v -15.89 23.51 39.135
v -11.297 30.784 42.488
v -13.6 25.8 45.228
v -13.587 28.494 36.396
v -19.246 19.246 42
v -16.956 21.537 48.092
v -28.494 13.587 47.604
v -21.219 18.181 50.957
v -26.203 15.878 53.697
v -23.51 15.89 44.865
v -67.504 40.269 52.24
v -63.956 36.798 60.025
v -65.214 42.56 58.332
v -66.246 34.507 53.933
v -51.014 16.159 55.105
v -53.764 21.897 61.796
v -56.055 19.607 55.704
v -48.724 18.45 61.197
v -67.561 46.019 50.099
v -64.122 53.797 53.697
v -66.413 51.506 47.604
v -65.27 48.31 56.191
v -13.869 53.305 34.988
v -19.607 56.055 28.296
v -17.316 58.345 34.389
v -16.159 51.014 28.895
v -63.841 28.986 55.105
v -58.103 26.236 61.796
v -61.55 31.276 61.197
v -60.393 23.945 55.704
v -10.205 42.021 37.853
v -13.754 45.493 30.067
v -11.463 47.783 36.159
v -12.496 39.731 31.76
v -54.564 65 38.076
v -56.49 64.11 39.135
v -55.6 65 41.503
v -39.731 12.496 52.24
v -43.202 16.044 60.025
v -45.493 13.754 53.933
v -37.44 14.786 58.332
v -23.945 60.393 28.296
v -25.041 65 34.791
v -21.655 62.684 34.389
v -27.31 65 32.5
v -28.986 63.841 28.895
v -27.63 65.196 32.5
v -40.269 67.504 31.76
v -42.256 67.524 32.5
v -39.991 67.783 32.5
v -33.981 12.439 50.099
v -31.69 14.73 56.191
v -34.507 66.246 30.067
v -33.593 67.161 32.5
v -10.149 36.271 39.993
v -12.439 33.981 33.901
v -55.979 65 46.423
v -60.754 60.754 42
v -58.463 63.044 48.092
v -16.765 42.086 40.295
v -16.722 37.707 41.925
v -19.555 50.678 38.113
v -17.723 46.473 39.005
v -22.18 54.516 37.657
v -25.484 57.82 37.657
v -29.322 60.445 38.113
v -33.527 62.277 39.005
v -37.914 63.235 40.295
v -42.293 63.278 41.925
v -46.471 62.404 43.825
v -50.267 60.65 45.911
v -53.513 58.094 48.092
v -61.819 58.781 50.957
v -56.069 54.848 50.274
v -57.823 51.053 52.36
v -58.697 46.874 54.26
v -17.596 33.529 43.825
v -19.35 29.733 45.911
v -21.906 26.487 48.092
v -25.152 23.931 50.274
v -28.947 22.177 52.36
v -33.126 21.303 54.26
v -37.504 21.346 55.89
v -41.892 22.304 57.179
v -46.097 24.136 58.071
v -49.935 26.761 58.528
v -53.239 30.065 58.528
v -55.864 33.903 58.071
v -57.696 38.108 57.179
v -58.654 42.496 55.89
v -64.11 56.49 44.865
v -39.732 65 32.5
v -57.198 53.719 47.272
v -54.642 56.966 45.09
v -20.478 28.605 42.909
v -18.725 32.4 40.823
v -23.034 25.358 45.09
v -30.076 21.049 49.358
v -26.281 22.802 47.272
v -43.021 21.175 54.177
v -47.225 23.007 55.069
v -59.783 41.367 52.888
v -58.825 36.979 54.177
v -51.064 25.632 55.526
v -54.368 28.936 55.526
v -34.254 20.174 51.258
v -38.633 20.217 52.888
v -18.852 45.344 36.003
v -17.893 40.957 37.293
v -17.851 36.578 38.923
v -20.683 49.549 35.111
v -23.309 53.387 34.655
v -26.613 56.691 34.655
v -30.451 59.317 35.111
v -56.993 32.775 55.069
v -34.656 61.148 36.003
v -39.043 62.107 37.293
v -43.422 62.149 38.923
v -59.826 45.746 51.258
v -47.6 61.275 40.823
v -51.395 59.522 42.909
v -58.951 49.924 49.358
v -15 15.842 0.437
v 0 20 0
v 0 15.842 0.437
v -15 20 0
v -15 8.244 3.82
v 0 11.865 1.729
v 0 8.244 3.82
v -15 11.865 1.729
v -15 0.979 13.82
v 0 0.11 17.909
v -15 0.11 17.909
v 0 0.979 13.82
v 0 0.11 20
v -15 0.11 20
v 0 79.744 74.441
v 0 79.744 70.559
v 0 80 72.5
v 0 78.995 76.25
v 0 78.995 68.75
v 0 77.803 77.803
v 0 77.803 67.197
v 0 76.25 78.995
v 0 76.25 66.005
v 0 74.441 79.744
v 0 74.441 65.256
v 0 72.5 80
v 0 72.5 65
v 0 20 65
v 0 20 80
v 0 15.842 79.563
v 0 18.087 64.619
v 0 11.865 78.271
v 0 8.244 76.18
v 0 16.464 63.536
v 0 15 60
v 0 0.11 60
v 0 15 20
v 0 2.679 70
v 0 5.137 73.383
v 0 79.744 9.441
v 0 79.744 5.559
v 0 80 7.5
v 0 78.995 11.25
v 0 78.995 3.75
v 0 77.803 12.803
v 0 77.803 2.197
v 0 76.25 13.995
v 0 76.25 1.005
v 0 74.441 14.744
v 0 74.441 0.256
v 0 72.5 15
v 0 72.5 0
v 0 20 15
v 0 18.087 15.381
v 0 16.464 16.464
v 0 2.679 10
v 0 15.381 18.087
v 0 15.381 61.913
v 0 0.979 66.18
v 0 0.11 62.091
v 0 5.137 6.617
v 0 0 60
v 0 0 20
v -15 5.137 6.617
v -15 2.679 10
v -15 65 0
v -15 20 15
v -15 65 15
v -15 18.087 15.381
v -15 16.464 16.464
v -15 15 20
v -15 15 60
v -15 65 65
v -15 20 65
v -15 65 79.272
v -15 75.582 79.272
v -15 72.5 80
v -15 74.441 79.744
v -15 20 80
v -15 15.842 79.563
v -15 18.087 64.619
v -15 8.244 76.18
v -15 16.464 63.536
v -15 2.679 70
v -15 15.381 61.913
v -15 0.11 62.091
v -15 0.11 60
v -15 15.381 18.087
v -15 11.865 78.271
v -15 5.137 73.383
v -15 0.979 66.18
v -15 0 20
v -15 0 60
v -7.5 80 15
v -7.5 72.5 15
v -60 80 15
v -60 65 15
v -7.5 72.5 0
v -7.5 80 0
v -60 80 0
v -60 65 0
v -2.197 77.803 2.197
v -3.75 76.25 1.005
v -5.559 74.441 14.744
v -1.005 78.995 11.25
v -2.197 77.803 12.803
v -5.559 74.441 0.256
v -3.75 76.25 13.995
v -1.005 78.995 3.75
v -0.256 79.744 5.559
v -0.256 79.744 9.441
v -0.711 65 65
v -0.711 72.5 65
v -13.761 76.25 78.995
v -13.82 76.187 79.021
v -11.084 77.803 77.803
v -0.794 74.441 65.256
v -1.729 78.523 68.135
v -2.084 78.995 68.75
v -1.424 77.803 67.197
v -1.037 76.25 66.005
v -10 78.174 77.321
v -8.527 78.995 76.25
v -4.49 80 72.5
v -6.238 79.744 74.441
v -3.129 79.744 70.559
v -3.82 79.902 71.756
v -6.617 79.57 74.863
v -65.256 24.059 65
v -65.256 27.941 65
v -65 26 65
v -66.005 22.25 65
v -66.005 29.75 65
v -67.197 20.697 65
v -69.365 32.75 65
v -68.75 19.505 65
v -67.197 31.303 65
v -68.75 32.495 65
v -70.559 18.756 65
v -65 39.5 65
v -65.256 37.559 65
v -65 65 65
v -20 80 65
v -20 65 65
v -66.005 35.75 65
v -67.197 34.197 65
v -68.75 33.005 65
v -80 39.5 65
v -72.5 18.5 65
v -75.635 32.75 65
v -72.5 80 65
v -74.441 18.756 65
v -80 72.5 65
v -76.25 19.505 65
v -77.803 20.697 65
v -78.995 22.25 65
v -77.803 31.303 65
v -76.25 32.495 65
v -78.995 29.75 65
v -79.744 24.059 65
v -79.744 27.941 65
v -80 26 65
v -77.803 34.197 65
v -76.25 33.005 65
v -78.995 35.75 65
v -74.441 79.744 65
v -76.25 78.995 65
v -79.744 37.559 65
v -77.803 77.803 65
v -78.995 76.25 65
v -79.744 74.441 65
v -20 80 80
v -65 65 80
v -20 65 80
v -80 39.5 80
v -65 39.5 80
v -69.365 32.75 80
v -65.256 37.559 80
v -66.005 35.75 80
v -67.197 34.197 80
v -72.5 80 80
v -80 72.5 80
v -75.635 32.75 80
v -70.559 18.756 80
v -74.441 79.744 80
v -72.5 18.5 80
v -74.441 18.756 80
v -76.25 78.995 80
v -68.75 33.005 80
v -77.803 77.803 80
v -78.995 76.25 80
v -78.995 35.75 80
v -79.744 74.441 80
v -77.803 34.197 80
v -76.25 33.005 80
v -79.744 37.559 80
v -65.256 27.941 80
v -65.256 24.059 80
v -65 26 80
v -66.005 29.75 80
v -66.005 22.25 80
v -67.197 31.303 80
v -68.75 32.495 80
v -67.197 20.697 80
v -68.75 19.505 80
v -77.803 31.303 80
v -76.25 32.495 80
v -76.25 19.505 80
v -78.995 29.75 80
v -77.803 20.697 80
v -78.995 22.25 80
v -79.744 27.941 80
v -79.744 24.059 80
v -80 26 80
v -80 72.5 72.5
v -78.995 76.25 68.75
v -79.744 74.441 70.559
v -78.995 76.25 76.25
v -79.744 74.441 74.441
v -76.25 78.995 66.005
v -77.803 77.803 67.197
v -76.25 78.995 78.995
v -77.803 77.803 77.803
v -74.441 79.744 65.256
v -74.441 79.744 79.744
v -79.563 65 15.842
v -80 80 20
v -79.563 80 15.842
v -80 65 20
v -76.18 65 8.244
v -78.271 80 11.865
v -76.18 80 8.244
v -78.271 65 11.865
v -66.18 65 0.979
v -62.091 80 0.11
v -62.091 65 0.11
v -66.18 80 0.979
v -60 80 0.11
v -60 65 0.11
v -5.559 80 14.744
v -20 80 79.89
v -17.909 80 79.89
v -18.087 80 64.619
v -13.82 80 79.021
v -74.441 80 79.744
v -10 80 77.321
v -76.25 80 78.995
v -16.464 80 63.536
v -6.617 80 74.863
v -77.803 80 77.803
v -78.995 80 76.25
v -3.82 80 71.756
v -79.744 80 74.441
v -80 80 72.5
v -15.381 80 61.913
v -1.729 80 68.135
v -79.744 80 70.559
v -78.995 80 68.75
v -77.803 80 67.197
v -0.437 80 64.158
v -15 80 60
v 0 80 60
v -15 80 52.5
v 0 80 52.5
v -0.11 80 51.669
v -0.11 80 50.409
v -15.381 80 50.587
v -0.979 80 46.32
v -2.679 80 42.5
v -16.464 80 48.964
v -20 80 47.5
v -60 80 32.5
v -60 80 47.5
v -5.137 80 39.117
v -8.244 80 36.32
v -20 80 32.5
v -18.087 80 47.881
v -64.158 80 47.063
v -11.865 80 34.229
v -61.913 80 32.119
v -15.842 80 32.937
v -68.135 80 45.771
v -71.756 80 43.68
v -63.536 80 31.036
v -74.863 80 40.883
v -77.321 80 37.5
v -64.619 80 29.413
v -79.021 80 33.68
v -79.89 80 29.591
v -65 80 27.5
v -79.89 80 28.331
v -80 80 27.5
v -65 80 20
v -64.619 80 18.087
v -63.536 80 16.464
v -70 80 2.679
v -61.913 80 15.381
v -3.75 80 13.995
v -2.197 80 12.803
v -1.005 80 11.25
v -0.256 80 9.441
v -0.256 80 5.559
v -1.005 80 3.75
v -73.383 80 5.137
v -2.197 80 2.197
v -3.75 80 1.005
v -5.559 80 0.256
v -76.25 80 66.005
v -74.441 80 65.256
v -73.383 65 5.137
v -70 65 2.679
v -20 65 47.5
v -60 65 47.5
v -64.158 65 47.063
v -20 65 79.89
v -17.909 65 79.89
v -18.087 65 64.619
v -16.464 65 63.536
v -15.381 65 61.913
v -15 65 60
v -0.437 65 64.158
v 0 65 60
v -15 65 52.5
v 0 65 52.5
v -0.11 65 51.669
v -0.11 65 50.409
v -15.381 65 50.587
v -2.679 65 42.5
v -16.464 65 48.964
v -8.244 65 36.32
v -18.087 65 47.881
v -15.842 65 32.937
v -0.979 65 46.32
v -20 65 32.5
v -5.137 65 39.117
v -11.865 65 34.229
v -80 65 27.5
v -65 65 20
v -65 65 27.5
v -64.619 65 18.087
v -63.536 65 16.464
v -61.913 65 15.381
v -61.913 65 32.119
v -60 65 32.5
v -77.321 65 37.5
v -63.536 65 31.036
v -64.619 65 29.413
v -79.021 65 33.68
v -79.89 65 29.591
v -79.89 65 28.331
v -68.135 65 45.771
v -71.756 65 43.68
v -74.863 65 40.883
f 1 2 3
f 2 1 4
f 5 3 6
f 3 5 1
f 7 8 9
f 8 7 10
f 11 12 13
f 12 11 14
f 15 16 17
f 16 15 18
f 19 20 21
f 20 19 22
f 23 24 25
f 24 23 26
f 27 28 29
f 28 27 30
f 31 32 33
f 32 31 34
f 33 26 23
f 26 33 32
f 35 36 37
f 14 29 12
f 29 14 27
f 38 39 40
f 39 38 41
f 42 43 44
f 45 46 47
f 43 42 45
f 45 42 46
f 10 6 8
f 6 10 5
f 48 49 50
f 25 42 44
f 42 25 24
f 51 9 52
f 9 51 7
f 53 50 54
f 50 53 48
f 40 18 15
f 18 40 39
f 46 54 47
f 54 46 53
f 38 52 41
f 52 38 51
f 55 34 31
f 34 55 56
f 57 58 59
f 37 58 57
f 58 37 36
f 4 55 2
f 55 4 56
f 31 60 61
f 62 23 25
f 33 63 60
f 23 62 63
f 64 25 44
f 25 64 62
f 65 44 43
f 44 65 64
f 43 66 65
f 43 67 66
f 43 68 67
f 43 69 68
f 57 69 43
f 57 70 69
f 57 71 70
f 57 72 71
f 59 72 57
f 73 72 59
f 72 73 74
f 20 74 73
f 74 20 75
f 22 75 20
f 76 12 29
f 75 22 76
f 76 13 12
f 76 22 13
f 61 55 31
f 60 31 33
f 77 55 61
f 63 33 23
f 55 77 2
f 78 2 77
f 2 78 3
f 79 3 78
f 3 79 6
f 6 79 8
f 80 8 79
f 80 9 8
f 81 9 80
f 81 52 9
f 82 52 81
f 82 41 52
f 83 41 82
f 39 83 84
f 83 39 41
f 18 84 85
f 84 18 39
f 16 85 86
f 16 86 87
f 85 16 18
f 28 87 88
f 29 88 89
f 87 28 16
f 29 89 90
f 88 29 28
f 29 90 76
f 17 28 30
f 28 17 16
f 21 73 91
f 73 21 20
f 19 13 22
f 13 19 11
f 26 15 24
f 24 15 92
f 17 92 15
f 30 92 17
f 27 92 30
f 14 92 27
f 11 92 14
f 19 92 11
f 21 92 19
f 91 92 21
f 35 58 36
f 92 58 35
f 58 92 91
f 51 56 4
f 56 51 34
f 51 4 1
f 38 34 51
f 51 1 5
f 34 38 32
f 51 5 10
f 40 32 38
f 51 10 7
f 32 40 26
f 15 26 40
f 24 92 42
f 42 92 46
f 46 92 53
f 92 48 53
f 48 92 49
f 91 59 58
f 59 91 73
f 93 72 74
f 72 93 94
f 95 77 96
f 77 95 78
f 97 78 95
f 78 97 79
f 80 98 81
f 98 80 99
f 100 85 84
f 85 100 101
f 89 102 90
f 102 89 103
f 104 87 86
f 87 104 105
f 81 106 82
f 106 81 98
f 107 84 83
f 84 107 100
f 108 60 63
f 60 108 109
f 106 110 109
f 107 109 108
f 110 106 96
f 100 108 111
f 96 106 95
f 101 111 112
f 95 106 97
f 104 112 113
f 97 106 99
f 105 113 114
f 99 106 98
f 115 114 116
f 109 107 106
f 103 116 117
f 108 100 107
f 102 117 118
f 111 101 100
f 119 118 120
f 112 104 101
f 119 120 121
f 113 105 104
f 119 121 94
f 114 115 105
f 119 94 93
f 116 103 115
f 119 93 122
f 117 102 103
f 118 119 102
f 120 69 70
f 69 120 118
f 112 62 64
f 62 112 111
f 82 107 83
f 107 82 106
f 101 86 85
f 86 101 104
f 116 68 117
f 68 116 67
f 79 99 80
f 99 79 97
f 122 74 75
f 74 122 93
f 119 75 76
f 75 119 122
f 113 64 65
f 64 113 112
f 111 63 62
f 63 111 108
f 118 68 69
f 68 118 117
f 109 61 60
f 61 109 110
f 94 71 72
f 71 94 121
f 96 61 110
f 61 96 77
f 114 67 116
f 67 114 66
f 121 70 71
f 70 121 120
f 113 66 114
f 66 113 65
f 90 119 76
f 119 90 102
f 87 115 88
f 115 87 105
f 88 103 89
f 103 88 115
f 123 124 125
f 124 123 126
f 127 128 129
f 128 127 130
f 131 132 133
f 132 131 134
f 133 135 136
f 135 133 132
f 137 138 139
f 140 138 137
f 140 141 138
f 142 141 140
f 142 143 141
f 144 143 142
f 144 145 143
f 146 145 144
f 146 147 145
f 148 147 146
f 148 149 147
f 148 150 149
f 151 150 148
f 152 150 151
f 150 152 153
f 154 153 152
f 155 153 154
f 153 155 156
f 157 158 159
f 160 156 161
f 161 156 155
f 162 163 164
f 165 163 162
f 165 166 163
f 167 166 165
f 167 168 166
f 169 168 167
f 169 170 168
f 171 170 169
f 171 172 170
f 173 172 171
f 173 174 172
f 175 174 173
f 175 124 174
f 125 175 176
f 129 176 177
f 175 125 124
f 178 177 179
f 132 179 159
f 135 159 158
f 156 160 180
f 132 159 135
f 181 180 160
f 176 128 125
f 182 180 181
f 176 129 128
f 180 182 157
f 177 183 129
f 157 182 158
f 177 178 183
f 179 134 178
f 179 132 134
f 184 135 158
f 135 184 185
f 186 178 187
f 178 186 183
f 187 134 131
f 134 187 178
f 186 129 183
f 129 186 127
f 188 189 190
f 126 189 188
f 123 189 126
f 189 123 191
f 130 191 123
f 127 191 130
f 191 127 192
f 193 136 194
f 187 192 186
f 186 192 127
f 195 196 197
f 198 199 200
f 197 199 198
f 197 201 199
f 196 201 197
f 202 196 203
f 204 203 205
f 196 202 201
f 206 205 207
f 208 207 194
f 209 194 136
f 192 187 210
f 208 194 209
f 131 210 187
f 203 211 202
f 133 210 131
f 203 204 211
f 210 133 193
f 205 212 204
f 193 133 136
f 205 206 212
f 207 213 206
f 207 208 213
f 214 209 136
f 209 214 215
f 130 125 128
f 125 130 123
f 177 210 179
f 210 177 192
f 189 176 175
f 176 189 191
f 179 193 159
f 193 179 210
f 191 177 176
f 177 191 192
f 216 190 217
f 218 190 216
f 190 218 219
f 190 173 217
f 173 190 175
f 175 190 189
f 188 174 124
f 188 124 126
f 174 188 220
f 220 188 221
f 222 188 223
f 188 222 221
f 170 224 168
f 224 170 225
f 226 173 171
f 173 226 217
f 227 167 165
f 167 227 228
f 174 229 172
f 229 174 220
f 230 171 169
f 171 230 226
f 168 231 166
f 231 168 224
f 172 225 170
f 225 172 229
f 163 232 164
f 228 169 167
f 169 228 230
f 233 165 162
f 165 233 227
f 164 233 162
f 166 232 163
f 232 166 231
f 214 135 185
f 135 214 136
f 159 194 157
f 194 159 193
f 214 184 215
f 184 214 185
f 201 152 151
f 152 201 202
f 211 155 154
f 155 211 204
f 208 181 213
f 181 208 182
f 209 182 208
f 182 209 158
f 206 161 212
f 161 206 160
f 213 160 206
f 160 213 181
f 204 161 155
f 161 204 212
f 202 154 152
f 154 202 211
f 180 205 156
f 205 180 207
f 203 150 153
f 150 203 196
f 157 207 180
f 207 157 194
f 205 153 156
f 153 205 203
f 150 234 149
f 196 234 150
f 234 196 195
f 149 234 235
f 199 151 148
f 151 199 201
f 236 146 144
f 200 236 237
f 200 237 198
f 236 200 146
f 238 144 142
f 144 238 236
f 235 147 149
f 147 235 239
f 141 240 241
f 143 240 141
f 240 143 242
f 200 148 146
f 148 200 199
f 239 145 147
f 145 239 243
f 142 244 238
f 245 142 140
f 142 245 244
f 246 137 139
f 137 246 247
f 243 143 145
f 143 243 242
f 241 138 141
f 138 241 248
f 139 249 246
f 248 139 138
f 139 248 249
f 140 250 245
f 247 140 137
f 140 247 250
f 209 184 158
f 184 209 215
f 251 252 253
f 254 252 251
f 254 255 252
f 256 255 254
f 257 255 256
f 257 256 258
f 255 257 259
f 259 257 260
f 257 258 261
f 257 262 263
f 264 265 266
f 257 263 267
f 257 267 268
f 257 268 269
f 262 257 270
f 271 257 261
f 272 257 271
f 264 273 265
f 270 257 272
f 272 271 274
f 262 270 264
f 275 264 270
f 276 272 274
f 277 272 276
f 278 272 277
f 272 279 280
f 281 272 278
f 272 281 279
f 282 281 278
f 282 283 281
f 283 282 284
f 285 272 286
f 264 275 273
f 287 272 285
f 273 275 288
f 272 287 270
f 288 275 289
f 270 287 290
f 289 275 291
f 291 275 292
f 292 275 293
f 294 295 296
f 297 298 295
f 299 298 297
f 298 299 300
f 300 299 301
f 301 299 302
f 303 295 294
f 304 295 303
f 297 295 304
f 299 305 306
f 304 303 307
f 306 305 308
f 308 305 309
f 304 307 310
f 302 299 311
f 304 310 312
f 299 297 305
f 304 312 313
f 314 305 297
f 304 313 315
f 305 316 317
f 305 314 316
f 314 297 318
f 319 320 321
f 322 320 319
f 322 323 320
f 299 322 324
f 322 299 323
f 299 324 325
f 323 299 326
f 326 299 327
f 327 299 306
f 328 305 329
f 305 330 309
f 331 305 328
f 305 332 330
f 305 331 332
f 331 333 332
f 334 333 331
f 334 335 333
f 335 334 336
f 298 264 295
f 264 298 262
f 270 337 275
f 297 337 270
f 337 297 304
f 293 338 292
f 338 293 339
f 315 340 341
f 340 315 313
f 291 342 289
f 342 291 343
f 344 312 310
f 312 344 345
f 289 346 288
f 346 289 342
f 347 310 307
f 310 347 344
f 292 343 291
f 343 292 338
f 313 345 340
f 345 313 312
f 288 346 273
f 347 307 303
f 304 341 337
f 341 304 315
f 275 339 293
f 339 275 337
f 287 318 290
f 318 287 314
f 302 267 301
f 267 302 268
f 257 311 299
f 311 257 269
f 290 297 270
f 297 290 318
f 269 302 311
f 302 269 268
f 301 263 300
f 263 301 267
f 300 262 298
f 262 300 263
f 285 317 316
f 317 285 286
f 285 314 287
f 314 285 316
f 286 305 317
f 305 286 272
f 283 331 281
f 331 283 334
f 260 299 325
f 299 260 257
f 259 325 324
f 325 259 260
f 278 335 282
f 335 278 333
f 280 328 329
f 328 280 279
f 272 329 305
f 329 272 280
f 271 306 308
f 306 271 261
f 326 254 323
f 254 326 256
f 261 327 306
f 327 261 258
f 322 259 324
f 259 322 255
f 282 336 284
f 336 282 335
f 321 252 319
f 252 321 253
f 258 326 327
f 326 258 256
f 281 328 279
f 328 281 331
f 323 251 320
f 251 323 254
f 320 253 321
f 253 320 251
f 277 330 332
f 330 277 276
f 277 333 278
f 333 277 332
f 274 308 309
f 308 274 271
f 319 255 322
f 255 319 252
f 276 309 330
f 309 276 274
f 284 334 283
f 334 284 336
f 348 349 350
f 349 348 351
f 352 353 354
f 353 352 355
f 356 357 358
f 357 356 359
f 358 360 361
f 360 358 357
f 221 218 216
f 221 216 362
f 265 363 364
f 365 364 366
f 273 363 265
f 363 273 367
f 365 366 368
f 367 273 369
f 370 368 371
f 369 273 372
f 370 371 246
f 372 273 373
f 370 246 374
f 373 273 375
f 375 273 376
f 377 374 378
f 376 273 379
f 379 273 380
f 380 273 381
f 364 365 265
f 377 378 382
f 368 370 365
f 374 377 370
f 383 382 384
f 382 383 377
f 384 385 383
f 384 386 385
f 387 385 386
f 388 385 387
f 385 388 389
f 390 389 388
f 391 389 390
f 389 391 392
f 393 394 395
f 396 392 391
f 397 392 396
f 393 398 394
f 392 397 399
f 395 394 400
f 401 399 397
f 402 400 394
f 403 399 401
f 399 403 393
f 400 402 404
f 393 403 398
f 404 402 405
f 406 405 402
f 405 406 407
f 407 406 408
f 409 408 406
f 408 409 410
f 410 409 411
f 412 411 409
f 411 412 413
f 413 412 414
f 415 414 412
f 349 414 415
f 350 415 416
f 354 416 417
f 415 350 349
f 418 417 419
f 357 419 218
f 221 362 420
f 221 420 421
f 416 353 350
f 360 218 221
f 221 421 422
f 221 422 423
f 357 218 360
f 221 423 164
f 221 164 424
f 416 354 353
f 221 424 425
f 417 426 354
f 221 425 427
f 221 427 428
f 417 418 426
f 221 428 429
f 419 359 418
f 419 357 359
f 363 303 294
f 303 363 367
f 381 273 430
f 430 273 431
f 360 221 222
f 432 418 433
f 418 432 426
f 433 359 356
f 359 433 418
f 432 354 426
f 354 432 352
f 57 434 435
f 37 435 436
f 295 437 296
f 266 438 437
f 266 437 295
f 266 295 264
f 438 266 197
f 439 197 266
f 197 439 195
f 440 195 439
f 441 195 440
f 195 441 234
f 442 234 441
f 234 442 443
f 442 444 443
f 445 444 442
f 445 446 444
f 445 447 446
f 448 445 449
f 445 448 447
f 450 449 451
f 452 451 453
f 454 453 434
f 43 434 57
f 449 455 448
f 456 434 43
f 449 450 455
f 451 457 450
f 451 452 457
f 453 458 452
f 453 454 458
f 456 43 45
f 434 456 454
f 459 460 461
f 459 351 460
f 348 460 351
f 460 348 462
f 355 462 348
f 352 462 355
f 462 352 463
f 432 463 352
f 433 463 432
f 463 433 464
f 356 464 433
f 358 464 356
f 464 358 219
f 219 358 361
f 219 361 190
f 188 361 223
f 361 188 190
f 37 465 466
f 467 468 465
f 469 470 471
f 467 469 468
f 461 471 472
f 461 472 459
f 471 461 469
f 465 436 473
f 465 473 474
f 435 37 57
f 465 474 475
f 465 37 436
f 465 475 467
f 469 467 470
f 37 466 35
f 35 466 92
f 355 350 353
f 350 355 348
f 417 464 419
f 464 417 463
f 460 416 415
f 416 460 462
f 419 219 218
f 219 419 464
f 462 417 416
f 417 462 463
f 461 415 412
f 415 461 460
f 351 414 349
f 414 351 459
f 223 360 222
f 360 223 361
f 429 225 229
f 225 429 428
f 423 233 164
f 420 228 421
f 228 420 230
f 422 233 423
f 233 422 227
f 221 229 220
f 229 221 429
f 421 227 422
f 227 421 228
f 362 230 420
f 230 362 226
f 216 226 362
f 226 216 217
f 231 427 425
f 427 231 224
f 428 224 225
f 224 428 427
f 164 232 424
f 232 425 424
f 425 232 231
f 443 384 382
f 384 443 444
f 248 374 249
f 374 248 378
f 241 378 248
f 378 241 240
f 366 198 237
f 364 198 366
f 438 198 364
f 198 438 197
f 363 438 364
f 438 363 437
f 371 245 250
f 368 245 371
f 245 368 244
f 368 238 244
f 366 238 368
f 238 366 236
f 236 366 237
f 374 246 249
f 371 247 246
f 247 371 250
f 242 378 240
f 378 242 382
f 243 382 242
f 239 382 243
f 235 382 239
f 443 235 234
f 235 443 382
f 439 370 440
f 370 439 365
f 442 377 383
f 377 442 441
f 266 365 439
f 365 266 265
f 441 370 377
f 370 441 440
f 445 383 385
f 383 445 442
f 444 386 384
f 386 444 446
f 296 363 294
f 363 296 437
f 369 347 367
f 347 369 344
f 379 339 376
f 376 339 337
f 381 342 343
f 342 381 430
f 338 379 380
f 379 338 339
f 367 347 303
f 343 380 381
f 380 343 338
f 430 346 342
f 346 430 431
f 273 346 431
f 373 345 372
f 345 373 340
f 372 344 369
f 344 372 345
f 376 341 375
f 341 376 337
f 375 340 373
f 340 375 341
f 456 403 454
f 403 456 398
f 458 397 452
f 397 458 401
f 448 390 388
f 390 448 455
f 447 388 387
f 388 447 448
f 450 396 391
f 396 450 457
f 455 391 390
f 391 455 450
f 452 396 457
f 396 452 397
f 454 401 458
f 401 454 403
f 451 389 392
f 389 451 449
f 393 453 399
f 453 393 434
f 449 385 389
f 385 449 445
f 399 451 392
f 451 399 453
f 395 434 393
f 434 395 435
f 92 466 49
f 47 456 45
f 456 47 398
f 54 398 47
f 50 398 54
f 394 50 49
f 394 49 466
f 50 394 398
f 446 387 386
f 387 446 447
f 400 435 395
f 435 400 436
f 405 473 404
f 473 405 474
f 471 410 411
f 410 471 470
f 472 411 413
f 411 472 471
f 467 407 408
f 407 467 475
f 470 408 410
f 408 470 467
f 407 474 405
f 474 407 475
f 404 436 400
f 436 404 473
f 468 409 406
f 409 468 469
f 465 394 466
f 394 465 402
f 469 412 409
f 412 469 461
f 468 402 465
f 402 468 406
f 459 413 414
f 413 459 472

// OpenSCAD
CUBE_SIZE=80;
LETTER_THICK=15;

ANNIVERSARY_COIN_DIAMETER= 44.7;
ANNIVERSARY_COIN_THICK = 3.4;


// Letter will go up in +Z, out in +Y, thick in -X
module LetterL(letterHeight, letterWidth, letterThick, curveRadius)
{
  // Straight length parts (not the curve, not the rounded end)
  straightLengthBottom = letterWidth - curveRadius - letterThick / 2;
  straightLengthTop    = letterHeight - curveRadius - letterThick / 2;
  
  // Bottom part
  translate([-letterThick, curveRadius, 0])
    cube([letterThick, straightLengthBottom, letterThick]);
  
  translate([-letterThick, curveRadius + straightLengthBottom, letterThick / 2])
    rotate(a=90, v=[0,1,0])
      cylinder(h=letterThick, r=(letterThick / 2)); 
  
  // Top part
  translate([-letterThick, 0, curveRadius])
    cube([letterThick, letterThick, straightLengthTop]);
  
  translate([-letterThick, letterThick / 2, curveRadius + straightLengthTop])
    rotate(a=90, v=[0,1,0])
      cylinder(h=letterThick, r=(letterThick / 2));
  
  // Big radius
  intersection()
  {
    translate([-letterThick, 0, 0])
      cube([letterThick, curveRadius + .0001, curveRadius + .0001]);
    
    difference()
    {
    translate([-letterThick, curveRadius, curveRadius])
      rotate(a=90, v=[0,1,0])
        cylinder(h=letterThick, r=curveRadius);
      
    translate([-letterThick-.5, curveRadius, curveRadius])
      rotate(a=90, v=[0,1,0])
        cylinder(h=letterThick+1, r=curveRadius - letterThick);
      
    }    
  }
}


module LetterC(letterSize, letterThick, curveRadius) 
{
  // Letter will be in Y and Z planes.  Thickness from X=0 towards negative X.
  bottomHeight = letterSize / 2 + letterThick;
  LetterL(bottomHeight, letterSize, letterThick, curveRadius);
  
  translate([-letterThick, 0, letterSize])
    rotate(a=180, v=[0,1,0])
      LetterL(bottomHeight, letterSize, letterThick, curveRadius);
  
}

module LetterS(letterSize, letterThick, curveRadius) 
{
  // There are 4 L's in an S (top, left, right, bottom)
  // top and bottom are the same size
  // left and right are the same size
  
  TB_width = curveRadius + letterThick / 2 + .1;
  TB_height = letterSize;
  
  translate([0, letterSize, 0])
    rotate(a=90, v=[1,0,0])
      LetterL(TB_height, TB_width, letterThick, curveRadius);
  
  translate([0, 0, letterSize])
    rotate(a=90, v=[-1,0,0])
      LetterL(TB_height, TB_width, letterThick, curveRadius);
  
  LR_width = letterSize / 2 + letterThick / 2 + .001;
  LR_height = curveRadius + letterThick / 2 + .001;
  
  translate([0,0,letterSize/2 - letterThick / 2])
  LetterL(LR_height, LR_width, letterThick, curveRadius);
  
  translate([0, letterSize, letterSize / 2 + letterThick / 2])
  rotate(a=180, v=[1,0,0])
  LetterL(LR_height, LR_width, letterThick, curveRadius);
  
  // There are also little sections that join bottom to the LR, and top to the LR
  littleSectsHeight = (letterSize - ( curveRadius * 4 - letterThick) ) / 2;
  echo("Little Sects Height = ", littleSectsHeight);
  
  translate([-letterThick, letterSize - letterThick, curveRadius])
    cube([letterThick, letterThick, littleSectsHeight]);
    
  translate([-letterThick, 0, letterSize / 2 - letterThick / 2 + curveRadius])
    cube([letterThick, letterThick, littleSectsHeight]);
  
}

// Just goes up +z
module LetterLittleI(letterSize, letterThick)
{
  // Going to have 3/5 of letter be stick part of i
  // Then on top of that a ball
  
  stickLen = letterSize / 5 * 3;
  stickCubeLen = stickLen - letterThick;
  
  // cube part of stick
  translate([-letterThick, 0, letterThick / 2])
    cube([letterThick, letterThick, stickCubeLen]);
  
  // bottom rounded part of stick
  translate([-letterThick, letterThick / 2, letterThick / 2])
    rotate(a=90, v=[0,1,0])
      cylinder(h=letterThick, r=letterThick / 2);
  
  translate([-letterThick, letterThick / 2,  + stickCubeLen + letterThick / 2])
    rotate(a=90, v=[0,1,0])
      cylinder(h=letterThick, r=letterThick / 2);

  translate([-letterThick, letterThick / 2, stickLen + letterThick * 2 / 5])
  rotate(a=90, v=[0,1,0])
    cylinder(h=letterThick, r=letterThick / 2);

}

module CoinHolder(coinDiameter, coinThick)
{
  COIN_WALL_THICK=3.5;
  
  
  
  difference()
  {
    cylinder(h=coinThick + COIN_WALL_THICK, r=coinDiameter / 2 + 2 * COIN_WALL_THICK);
    
    translate([0,0,COIN_WALL_THICK])
    cylinder(h=coinThick + 1, r=coinDiameter / 2);
  }
}

module graphicLogo(xSize, ySize, zSize)
{
  resize([xSize,ySize,zSize])
  intersection()
  {
    translate([0,0,50])
      surface(file="old_si_logo/si-2d-grey.png", invert=true);
    
    cube([100,100,10]);
  }
  
  //import("old_logo.stl");
}

module Logo3d(printCoinHolder)
{
  if (printCoinHolder != 0)
  {
    translate([-CUBE_SIZE / 2, CUBE_SIZE / 2, 42])
      rotate(a=45, v=[0,0,-1])
        rotate(a=28, v=[-1,0,0])
          CoinHolder(ANNIVERSARY_COIN_DIAMETER, ANNIVERSARY_COIN_THICK);
    
    
    OLD_LOGO_WIDTH=20;
    
    translate([-20,-20,0])
    
    translate([0,CUBE_SIZE,0])
    
    
    rotate(135, [0,0,-1])
    translate([0,OLD_LOGO_WIDTH/2,0])
      rotate(90, [1,0,0])
        graphicLogo(50,50,OLD_LOGO_WIDTH);
  }

  LetterC(CUBE_SIZE, LETTER_THICK, 20);

  translate([-CUBE_SIZE, CUBE_SIZE, CUBE_SIZE - LETTER_THICK])
  rotate(a=90, v=[0,1,0])
  rotate(a=90, v=[1,0,0])
  LetterLittleI(CUBE_SIZE, LETTER_THICK);

  translate([0, CUBE_SIZE, 0])
    rotate(a=90, v=[0,0,1])
      LetterS(CUBE_SIZE, LETTER_THICK, 20);
}

// Rotate letter for better printing
//rotate(a=90, v=[0,1,0])
  Logo3d(1);     // Change the 0 to a 1 to print the coin holder part



//graphicLogo();



//rotate(135,[0,0,1])
//translate([0,2.5,0])
//rotate(90,[1,0,0])

        //graphicLogo();
